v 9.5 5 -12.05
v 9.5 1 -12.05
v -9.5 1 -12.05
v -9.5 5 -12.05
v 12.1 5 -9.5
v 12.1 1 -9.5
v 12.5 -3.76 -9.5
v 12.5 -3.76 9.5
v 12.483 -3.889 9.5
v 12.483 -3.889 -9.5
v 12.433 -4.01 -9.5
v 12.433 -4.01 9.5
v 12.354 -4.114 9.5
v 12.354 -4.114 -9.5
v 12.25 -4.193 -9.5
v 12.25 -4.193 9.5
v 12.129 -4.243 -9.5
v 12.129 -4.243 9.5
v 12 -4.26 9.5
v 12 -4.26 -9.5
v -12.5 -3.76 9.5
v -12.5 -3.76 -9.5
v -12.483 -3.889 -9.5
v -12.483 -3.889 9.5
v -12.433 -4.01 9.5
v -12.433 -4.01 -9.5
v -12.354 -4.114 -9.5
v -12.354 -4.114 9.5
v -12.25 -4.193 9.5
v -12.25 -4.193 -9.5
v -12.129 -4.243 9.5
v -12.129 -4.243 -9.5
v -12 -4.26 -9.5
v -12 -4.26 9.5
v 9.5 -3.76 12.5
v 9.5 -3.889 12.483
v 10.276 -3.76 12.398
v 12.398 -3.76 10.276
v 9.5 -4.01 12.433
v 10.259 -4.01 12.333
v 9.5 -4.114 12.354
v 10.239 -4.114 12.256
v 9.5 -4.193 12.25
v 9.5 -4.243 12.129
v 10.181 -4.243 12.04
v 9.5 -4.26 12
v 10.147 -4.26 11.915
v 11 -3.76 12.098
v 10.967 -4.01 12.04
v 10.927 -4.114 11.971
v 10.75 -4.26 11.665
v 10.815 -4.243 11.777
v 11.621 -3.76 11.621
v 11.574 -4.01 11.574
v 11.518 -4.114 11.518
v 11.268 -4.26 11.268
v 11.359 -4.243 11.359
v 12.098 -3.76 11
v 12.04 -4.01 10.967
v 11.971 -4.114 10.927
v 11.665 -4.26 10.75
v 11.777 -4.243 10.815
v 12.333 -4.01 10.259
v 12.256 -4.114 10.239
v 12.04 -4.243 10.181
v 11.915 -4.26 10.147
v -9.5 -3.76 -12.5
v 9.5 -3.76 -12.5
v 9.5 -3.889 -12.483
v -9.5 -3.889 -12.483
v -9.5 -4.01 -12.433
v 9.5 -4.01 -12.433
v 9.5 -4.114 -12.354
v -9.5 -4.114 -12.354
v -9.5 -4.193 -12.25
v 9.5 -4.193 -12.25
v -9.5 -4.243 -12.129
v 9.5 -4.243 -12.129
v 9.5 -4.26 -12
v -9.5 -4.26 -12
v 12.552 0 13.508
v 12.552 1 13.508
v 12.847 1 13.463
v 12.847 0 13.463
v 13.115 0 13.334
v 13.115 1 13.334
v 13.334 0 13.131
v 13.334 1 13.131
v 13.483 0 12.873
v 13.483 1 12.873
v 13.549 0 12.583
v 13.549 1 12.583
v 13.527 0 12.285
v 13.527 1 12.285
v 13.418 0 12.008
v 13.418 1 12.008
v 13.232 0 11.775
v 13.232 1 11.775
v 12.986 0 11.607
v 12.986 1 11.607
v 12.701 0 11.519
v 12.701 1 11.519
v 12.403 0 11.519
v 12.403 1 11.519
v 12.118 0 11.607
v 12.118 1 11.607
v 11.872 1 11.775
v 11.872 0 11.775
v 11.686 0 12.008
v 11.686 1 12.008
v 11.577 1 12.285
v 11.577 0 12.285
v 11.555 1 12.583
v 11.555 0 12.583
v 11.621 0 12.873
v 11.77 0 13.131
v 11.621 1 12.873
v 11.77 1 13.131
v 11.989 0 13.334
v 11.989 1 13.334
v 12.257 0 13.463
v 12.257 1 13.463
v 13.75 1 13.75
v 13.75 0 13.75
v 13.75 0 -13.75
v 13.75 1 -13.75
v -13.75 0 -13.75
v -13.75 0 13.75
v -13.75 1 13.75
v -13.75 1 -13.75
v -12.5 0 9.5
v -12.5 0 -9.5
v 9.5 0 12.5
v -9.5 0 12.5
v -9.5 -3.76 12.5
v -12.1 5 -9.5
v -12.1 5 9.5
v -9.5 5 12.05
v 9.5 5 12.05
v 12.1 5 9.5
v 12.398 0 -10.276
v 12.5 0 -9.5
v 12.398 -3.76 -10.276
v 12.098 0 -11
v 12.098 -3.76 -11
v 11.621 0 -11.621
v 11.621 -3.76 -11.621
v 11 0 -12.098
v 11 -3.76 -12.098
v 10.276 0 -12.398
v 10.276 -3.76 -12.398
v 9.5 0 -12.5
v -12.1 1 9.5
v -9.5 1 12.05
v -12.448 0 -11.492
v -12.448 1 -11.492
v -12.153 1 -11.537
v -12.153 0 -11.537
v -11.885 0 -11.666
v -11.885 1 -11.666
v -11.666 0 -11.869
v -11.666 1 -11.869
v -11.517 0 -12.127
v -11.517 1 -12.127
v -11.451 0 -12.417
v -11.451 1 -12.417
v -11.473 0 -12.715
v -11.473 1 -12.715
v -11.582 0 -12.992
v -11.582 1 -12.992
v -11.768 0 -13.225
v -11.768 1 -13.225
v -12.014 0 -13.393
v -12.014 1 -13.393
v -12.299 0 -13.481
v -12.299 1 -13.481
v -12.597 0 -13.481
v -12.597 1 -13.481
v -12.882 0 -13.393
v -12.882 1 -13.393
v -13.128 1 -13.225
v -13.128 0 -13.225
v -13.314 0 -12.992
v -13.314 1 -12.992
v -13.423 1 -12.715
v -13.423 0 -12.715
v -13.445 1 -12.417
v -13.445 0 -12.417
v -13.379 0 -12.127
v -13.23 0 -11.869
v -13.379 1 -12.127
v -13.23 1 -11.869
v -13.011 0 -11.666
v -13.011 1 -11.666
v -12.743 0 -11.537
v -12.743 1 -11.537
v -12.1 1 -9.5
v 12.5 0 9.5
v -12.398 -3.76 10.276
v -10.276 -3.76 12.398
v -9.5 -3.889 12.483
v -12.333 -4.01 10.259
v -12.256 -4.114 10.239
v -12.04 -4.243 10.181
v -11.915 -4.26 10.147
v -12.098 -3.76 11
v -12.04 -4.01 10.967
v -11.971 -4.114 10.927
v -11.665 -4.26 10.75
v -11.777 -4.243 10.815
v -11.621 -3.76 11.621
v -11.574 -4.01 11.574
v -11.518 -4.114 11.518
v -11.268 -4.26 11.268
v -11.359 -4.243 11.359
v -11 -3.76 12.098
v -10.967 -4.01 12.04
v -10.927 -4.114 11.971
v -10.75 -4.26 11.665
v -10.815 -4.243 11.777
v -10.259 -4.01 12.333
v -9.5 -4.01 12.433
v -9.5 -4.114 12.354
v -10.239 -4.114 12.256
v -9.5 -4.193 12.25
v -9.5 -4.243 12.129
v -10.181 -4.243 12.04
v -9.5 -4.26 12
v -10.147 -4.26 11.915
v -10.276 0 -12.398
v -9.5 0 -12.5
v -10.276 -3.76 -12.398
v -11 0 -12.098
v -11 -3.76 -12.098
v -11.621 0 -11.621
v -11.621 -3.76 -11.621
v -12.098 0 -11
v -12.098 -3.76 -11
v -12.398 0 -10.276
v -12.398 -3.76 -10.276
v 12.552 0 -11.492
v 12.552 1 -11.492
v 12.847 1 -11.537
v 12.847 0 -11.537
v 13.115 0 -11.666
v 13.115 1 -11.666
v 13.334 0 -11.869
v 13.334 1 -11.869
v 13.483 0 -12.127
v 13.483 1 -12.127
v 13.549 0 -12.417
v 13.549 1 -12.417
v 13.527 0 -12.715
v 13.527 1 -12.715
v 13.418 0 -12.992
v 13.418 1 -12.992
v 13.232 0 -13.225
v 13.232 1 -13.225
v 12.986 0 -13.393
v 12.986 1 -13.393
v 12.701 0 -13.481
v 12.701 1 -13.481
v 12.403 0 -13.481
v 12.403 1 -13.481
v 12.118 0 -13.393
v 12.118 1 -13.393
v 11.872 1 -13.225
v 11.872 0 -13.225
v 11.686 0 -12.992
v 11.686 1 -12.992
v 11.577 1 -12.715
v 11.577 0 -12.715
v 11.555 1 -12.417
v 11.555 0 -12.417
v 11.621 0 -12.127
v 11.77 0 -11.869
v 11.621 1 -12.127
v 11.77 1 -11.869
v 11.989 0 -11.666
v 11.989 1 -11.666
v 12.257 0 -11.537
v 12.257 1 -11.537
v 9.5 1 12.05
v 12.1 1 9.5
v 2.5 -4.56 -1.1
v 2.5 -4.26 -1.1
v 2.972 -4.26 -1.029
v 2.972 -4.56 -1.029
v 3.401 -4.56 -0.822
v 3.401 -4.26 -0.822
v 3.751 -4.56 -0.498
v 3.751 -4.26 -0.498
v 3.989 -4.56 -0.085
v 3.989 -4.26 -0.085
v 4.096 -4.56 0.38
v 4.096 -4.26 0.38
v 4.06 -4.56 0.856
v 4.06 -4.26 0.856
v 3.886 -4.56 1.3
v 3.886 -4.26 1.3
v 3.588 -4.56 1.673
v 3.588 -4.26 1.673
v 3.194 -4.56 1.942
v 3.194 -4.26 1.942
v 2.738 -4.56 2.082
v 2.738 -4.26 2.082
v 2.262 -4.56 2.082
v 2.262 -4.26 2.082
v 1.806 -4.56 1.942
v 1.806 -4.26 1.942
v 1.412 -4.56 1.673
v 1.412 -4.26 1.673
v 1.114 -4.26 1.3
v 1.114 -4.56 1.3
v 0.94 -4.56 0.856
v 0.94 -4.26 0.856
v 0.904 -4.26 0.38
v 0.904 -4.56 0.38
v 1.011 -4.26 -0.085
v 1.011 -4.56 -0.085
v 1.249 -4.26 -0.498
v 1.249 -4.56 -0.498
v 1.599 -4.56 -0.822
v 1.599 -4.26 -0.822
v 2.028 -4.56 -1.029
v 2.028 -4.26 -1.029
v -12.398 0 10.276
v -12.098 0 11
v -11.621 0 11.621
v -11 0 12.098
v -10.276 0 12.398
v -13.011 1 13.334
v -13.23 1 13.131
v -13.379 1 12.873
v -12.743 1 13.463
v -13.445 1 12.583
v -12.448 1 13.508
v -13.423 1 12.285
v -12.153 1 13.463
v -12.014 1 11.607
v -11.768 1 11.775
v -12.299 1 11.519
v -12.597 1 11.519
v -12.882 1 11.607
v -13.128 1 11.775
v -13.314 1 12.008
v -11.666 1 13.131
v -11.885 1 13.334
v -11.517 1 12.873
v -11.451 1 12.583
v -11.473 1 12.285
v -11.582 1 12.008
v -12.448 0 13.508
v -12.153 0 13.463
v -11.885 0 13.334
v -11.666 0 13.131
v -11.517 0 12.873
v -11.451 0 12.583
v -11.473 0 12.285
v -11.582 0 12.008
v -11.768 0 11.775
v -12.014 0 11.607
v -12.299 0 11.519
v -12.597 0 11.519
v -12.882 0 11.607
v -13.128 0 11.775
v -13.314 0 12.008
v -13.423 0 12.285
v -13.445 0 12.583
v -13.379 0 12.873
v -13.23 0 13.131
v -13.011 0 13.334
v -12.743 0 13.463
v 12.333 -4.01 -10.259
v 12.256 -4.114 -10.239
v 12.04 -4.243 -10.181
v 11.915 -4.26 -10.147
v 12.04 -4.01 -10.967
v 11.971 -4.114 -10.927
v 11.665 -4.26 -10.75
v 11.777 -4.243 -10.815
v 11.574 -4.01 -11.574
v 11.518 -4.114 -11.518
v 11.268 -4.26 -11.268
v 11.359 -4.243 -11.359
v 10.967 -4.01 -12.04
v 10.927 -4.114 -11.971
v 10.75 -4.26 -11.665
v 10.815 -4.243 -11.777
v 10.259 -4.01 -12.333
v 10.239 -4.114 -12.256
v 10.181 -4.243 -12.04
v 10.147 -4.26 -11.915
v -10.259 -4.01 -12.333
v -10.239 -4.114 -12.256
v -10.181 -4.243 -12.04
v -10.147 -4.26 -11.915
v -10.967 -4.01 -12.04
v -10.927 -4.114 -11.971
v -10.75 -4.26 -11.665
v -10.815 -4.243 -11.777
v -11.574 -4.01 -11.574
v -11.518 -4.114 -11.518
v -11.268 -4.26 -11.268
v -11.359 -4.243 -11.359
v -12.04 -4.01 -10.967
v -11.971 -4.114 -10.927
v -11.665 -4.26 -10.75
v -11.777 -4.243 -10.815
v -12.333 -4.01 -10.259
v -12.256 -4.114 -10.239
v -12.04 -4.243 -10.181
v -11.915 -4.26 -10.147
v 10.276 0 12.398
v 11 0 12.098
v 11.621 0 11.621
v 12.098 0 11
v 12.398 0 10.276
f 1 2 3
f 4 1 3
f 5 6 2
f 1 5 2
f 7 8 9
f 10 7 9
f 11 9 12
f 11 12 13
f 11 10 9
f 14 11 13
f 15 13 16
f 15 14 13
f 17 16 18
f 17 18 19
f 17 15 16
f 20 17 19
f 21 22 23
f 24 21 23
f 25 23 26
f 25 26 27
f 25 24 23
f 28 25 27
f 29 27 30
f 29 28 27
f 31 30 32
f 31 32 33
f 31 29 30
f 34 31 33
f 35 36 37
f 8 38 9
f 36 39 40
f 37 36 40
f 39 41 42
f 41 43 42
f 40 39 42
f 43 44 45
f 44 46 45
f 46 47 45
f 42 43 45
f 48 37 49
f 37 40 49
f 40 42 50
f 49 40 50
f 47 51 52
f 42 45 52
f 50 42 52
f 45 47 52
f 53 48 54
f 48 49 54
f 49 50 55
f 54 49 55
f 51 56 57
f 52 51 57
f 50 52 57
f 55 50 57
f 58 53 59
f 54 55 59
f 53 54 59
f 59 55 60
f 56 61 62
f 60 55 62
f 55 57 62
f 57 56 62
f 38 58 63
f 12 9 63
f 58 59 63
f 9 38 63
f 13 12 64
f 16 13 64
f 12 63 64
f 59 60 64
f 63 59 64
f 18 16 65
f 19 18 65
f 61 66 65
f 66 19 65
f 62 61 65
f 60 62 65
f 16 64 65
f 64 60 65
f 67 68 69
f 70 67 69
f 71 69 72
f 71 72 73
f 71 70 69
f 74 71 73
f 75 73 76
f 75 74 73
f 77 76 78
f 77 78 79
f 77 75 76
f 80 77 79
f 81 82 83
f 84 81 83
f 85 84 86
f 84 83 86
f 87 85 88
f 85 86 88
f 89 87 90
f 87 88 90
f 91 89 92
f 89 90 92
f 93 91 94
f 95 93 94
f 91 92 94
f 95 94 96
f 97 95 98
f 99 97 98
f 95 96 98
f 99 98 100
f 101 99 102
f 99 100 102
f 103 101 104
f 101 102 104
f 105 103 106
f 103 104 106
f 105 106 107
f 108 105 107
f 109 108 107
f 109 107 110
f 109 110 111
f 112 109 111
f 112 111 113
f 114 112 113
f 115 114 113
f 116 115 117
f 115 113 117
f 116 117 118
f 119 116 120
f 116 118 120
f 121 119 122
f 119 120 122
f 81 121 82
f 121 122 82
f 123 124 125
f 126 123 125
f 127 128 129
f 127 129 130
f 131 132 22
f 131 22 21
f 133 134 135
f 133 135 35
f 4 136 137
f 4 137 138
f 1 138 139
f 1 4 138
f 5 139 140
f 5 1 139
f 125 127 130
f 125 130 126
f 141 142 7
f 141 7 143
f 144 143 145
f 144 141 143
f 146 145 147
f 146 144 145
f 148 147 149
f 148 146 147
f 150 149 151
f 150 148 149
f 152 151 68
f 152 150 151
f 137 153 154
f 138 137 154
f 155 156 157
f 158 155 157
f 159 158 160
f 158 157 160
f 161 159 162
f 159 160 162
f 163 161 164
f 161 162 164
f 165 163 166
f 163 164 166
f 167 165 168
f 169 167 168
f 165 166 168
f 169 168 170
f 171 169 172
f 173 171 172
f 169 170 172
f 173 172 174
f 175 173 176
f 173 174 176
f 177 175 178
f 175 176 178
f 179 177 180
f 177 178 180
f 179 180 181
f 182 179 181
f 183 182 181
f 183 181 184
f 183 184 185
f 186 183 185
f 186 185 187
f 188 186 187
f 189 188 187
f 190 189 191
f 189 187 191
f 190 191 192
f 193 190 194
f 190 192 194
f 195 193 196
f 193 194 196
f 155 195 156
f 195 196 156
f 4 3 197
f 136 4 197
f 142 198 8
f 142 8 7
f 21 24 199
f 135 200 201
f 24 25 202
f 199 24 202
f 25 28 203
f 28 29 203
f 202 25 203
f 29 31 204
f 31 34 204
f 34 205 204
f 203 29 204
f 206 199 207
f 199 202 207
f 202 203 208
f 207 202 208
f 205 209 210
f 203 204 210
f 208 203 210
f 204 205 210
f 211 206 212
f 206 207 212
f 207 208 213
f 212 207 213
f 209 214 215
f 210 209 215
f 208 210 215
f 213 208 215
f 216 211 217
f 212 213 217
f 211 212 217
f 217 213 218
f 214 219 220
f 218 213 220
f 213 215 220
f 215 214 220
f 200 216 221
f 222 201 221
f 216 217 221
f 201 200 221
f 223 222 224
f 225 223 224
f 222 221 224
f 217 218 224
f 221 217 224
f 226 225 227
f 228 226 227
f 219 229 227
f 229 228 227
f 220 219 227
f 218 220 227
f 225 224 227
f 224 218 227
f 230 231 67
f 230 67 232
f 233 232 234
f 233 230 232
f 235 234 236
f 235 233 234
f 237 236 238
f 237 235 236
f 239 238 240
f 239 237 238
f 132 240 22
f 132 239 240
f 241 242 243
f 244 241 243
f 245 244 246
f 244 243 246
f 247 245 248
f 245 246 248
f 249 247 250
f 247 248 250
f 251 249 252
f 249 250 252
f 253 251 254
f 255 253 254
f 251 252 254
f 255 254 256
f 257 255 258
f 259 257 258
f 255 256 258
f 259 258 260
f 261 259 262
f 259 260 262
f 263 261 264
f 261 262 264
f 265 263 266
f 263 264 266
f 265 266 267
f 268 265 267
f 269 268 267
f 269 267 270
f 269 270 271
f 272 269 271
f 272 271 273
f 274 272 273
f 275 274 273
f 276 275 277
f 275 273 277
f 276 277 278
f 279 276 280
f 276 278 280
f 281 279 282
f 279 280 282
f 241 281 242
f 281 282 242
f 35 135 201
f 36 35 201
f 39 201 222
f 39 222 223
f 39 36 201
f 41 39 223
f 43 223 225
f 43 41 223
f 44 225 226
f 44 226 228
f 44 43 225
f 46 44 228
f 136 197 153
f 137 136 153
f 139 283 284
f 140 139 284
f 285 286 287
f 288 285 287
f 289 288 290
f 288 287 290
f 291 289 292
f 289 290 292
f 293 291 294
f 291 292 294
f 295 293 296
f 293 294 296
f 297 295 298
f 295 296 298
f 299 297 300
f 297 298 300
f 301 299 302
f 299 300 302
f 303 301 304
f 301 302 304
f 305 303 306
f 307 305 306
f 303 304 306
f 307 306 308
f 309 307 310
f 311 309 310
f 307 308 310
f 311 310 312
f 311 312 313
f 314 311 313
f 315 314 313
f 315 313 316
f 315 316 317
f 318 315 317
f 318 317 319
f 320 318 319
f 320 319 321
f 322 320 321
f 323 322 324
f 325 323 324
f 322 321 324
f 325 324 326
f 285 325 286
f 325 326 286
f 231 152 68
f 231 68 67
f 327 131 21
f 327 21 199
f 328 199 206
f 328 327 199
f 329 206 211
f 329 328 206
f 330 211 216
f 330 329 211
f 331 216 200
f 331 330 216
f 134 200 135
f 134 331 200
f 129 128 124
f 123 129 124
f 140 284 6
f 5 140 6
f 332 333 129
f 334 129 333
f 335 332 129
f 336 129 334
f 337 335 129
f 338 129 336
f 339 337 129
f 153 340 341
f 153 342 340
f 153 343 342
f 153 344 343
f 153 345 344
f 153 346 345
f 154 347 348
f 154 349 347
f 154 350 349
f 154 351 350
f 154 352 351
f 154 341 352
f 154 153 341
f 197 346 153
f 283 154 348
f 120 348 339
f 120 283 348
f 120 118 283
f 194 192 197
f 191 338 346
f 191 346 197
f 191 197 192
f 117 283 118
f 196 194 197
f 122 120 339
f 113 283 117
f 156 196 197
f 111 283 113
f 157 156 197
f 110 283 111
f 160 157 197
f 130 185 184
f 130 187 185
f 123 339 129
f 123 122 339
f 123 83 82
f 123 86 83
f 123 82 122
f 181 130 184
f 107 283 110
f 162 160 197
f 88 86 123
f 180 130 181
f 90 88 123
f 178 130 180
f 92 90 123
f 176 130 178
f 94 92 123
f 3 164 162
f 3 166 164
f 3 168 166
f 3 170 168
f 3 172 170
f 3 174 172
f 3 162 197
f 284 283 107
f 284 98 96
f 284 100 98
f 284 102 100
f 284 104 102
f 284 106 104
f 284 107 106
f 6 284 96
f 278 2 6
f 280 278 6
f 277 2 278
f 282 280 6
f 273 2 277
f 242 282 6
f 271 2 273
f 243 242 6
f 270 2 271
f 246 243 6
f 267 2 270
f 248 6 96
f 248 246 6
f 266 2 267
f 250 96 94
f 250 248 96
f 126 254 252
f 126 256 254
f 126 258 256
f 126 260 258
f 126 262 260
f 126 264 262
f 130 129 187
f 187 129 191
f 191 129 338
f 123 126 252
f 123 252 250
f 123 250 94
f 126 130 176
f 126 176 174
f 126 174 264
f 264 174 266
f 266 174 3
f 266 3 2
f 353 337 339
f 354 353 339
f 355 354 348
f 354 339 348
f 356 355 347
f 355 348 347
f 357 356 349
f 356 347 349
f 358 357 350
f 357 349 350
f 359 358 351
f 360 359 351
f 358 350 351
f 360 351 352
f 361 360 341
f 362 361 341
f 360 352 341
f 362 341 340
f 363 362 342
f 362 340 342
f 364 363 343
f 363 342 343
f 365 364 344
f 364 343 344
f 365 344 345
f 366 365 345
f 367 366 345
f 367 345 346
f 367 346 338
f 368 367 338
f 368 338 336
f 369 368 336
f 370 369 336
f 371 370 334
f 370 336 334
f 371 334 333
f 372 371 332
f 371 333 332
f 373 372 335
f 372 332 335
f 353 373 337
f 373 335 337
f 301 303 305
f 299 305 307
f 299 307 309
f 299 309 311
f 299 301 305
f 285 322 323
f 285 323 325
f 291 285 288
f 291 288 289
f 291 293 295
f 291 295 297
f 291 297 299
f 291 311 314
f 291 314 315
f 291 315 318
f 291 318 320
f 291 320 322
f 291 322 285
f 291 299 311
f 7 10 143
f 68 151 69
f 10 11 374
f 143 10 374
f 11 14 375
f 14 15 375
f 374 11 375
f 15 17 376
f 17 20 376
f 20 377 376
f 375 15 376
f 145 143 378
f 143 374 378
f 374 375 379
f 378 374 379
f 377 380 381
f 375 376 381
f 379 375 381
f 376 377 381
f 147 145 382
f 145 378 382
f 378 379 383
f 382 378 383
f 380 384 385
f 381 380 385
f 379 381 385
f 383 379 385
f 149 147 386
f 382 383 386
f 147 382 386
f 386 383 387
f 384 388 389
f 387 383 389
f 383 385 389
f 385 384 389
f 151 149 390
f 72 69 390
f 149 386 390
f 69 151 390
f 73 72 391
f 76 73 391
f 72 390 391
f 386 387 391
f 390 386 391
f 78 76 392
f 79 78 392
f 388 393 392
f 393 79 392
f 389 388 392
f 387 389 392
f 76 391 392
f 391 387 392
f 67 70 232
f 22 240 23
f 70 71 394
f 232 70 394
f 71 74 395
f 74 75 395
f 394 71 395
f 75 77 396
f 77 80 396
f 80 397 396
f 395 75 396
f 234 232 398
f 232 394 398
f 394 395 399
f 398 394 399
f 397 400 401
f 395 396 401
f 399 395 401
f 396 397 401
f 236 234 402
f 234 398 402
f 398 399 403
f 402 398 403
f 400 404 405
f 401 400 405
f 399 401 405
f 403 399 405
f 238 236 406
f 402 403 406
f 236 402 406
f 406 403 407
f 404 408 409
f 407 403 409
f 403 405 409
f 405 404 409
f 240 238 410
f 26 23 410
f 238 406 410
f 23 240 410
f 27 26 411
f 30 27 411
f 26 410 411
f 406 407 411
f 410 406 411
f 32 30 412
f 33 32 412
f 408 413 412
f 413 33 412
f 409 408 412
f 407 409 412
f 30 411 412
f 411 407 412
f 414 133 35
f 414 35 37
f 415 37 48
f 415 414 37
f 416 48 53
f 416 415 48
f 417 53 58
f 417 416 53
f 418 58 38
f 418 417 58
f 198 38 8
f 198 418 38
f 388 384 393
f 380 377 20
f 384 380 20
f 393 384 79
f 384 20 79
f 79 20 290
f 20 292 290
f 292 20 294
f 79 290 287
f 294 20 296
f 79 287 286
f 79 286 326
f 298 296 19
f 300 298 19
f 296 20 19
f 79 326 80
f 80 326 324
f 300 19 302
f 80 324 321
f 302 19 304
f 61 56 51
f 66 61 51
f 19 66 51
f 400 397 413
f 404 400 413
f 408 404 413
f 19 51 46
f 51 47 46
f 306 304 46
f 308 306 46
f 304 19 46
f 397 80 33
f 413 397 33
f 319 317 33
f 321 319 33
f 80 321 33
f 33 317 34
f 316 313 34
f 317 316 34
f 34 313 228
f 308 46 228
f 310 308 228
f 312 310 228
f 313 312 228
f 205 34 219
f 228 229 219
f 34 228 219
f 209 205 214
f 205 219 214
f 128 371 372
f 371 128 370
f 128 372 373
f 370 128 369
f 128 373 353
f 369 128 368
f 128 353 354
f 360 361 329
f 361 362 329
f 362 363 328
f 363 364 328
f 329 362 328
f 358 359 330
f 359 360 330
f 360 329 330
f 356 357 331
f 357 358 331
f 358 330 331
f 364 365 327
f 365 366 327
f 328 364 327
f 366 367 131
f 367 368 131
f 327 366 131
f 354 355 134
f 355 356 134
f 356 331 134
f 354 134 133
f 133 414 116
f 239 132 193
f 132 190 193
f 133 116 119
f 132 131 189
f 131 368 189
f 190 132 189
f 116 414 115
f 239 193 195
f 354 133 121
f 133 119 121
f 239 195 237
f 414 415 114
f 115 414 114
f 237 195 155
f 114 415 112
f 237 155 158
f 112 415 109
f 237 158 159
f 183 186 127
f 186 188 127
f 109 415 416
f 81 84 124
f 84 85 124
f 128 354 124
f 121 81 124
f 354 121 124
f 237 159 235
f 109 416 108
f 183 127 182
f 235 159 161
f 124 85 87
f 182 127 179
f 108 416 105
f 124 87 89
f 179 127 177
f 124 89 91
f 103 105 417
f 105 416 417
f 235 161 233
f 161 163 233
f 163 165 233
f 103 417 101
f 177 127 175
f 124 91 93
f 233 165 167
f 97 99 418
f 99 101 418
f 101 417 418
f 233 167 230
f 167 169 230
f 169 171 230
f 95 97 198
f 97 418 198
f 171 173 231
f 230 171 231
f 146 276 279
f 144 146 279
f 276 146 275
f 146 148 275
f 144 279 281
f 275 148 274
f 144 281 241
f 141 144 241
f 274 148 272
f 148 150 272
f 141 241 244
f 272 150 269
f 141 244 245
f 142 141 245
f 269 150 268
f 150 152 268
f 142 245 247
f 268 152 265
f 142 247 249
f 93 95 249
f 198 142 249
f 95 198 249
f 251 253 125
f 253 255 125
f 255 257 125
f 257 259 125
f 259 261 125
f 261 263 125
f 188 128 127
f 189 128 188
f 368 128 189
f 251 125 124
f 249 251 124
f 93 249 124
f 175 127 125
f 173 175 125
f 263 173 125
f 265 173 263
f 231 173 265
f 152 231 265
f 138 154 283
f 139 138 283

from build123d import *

# Parameters (mm, degrees)
SKETCH_1_W          = 27.5
SKETCH_1_H          = 27.5
EXTRUDE_1_DEPTH     = 1
SKETCH_2_R          = 1
CUT_EXTRUDE_1_DEPTH = 1
EXTRUDE_2_DEPTH     = 4
EXTRUDE_3_DEPTH     = 4.26
SKETCH_5_R          = 1.6
EXTRUDE_4_DEPTH     = 0.3
FILLET_1_R          = 0.5


with BuildPart() as part:
    # 草图1 → 凸台-拉伸1 (new body)
    with BuildSketch(Plane(origin=(0, 0, 0), x_dir=(1, 0, 0), z_dir=(0, 1, 0))):
        Rectangle(SKETCH_1_W, SKETCH_1_H)
    extrude(amount=EXTRUDE_1_DEPTH)

    # 草图2 → 切除-拉伸1 (cut)
    with BuildSketch(Plane(origin=(0, 1, 0), x_dir=(1, 0, 0), z_dir=(0, 1, 0))):
        with Locations(Location((-12.447971734, 12.492096903, 0), (0, 0, 270))):
            Circle(SKETCH_2_R)
        with Locations(Location((12.552028266, 12.492096903, 0), (0, 0, 270))):
            Circle(SKETCH_2_R)
        with Locations(Location((12.552028266, -12.507903097, 0), (0, 0, 270))):
            Circle(SKETCH_2_R)
        with Locations(Location((-12.447971734, -12.507903097, 0), (0, 0, 270))):
            Circle(SKETCH_2_R)
    extrude(amount=-CUT_EXTRUDE_1_DEPTH, mode=Mode.SUBTRACT)

    # 草图3 → 凸台-拉伸2 (add)
    with BuildSketch(Plane(origin=(0, 1, 0), x_dir=(1, 0, 0), z_dir=(0, 1, 0))):
        Polygon((-9.5, 12.05), (-12.1, 9.5), (-12.1, -9.5), (-9.5, -12.05), (9.5, -12.05), (12.1, -9.5), (12.1, 9.5), (9.5, 12.05), align=None)
    extrude(amount=EXTRUDE_2_DEPTH)

    # 草图4 → 凸台-拉伸3 (add)
    with BuildSketch(Plane.XZ):
        with BuildLine():
            Line((-9.5, 12.5), (9.5, 12.5))
            ThreePointArc((9.5, 12.5), (11.621320344, 11.621320344), (12.5, 9.5))
            Line((12.5, 9.5), (12.5, -9.5))
            ThreePointArc((12.5, -9.5), (11.621320344, -11.621320344), (9.5, -12.5))
            Line((9.5, -12.5), (-9.5, -12.5))
            ThreePointArc((-9.5, -12.5), (-11.621320344, -11.621320344), (-12.5, -9.5))
            Line((-12.5, -9.5), (-12.5, 9.5))
            ThreePointArc((-12.5, 9.5), (-11.621320344, 11.621320344), (-9.5, 12.5))
        make_face()
    extrude(amount=EXTRUDE_3_DEPTH)

    # 草图5 → 凸台-拉伸4 (add)
    with BuildSketch(Plane.XZ.offset(4.26)):
        with Locations(Location((2.5, 0.5, 0), (0, 0, 270))):
            Circle(SKETCH_5_R)
    extrude(amount=EXTRUDE_4_DEPTH)

    # 圆角1
    fillet_1_edges = [part.edges().sort_by_distance(p)[0] for p in [
        (-11.621320344, -4.26, 11.621320344),
        (-12.5, -4.26, 0),
        (-11.621320344, -4.26, -11.621320344),
        (0, -4.26, -12.5),
        (11.621320344, -4.26, -11.621320344),
        (12.5, -4.26, 0),
        (11.621320344, -4.26, 11.621320344),
        (0, -4.26, 12.5),
    ]]
    fillet(fillet_1_edges, radius=FILLET_1_R)


solid = part.part
